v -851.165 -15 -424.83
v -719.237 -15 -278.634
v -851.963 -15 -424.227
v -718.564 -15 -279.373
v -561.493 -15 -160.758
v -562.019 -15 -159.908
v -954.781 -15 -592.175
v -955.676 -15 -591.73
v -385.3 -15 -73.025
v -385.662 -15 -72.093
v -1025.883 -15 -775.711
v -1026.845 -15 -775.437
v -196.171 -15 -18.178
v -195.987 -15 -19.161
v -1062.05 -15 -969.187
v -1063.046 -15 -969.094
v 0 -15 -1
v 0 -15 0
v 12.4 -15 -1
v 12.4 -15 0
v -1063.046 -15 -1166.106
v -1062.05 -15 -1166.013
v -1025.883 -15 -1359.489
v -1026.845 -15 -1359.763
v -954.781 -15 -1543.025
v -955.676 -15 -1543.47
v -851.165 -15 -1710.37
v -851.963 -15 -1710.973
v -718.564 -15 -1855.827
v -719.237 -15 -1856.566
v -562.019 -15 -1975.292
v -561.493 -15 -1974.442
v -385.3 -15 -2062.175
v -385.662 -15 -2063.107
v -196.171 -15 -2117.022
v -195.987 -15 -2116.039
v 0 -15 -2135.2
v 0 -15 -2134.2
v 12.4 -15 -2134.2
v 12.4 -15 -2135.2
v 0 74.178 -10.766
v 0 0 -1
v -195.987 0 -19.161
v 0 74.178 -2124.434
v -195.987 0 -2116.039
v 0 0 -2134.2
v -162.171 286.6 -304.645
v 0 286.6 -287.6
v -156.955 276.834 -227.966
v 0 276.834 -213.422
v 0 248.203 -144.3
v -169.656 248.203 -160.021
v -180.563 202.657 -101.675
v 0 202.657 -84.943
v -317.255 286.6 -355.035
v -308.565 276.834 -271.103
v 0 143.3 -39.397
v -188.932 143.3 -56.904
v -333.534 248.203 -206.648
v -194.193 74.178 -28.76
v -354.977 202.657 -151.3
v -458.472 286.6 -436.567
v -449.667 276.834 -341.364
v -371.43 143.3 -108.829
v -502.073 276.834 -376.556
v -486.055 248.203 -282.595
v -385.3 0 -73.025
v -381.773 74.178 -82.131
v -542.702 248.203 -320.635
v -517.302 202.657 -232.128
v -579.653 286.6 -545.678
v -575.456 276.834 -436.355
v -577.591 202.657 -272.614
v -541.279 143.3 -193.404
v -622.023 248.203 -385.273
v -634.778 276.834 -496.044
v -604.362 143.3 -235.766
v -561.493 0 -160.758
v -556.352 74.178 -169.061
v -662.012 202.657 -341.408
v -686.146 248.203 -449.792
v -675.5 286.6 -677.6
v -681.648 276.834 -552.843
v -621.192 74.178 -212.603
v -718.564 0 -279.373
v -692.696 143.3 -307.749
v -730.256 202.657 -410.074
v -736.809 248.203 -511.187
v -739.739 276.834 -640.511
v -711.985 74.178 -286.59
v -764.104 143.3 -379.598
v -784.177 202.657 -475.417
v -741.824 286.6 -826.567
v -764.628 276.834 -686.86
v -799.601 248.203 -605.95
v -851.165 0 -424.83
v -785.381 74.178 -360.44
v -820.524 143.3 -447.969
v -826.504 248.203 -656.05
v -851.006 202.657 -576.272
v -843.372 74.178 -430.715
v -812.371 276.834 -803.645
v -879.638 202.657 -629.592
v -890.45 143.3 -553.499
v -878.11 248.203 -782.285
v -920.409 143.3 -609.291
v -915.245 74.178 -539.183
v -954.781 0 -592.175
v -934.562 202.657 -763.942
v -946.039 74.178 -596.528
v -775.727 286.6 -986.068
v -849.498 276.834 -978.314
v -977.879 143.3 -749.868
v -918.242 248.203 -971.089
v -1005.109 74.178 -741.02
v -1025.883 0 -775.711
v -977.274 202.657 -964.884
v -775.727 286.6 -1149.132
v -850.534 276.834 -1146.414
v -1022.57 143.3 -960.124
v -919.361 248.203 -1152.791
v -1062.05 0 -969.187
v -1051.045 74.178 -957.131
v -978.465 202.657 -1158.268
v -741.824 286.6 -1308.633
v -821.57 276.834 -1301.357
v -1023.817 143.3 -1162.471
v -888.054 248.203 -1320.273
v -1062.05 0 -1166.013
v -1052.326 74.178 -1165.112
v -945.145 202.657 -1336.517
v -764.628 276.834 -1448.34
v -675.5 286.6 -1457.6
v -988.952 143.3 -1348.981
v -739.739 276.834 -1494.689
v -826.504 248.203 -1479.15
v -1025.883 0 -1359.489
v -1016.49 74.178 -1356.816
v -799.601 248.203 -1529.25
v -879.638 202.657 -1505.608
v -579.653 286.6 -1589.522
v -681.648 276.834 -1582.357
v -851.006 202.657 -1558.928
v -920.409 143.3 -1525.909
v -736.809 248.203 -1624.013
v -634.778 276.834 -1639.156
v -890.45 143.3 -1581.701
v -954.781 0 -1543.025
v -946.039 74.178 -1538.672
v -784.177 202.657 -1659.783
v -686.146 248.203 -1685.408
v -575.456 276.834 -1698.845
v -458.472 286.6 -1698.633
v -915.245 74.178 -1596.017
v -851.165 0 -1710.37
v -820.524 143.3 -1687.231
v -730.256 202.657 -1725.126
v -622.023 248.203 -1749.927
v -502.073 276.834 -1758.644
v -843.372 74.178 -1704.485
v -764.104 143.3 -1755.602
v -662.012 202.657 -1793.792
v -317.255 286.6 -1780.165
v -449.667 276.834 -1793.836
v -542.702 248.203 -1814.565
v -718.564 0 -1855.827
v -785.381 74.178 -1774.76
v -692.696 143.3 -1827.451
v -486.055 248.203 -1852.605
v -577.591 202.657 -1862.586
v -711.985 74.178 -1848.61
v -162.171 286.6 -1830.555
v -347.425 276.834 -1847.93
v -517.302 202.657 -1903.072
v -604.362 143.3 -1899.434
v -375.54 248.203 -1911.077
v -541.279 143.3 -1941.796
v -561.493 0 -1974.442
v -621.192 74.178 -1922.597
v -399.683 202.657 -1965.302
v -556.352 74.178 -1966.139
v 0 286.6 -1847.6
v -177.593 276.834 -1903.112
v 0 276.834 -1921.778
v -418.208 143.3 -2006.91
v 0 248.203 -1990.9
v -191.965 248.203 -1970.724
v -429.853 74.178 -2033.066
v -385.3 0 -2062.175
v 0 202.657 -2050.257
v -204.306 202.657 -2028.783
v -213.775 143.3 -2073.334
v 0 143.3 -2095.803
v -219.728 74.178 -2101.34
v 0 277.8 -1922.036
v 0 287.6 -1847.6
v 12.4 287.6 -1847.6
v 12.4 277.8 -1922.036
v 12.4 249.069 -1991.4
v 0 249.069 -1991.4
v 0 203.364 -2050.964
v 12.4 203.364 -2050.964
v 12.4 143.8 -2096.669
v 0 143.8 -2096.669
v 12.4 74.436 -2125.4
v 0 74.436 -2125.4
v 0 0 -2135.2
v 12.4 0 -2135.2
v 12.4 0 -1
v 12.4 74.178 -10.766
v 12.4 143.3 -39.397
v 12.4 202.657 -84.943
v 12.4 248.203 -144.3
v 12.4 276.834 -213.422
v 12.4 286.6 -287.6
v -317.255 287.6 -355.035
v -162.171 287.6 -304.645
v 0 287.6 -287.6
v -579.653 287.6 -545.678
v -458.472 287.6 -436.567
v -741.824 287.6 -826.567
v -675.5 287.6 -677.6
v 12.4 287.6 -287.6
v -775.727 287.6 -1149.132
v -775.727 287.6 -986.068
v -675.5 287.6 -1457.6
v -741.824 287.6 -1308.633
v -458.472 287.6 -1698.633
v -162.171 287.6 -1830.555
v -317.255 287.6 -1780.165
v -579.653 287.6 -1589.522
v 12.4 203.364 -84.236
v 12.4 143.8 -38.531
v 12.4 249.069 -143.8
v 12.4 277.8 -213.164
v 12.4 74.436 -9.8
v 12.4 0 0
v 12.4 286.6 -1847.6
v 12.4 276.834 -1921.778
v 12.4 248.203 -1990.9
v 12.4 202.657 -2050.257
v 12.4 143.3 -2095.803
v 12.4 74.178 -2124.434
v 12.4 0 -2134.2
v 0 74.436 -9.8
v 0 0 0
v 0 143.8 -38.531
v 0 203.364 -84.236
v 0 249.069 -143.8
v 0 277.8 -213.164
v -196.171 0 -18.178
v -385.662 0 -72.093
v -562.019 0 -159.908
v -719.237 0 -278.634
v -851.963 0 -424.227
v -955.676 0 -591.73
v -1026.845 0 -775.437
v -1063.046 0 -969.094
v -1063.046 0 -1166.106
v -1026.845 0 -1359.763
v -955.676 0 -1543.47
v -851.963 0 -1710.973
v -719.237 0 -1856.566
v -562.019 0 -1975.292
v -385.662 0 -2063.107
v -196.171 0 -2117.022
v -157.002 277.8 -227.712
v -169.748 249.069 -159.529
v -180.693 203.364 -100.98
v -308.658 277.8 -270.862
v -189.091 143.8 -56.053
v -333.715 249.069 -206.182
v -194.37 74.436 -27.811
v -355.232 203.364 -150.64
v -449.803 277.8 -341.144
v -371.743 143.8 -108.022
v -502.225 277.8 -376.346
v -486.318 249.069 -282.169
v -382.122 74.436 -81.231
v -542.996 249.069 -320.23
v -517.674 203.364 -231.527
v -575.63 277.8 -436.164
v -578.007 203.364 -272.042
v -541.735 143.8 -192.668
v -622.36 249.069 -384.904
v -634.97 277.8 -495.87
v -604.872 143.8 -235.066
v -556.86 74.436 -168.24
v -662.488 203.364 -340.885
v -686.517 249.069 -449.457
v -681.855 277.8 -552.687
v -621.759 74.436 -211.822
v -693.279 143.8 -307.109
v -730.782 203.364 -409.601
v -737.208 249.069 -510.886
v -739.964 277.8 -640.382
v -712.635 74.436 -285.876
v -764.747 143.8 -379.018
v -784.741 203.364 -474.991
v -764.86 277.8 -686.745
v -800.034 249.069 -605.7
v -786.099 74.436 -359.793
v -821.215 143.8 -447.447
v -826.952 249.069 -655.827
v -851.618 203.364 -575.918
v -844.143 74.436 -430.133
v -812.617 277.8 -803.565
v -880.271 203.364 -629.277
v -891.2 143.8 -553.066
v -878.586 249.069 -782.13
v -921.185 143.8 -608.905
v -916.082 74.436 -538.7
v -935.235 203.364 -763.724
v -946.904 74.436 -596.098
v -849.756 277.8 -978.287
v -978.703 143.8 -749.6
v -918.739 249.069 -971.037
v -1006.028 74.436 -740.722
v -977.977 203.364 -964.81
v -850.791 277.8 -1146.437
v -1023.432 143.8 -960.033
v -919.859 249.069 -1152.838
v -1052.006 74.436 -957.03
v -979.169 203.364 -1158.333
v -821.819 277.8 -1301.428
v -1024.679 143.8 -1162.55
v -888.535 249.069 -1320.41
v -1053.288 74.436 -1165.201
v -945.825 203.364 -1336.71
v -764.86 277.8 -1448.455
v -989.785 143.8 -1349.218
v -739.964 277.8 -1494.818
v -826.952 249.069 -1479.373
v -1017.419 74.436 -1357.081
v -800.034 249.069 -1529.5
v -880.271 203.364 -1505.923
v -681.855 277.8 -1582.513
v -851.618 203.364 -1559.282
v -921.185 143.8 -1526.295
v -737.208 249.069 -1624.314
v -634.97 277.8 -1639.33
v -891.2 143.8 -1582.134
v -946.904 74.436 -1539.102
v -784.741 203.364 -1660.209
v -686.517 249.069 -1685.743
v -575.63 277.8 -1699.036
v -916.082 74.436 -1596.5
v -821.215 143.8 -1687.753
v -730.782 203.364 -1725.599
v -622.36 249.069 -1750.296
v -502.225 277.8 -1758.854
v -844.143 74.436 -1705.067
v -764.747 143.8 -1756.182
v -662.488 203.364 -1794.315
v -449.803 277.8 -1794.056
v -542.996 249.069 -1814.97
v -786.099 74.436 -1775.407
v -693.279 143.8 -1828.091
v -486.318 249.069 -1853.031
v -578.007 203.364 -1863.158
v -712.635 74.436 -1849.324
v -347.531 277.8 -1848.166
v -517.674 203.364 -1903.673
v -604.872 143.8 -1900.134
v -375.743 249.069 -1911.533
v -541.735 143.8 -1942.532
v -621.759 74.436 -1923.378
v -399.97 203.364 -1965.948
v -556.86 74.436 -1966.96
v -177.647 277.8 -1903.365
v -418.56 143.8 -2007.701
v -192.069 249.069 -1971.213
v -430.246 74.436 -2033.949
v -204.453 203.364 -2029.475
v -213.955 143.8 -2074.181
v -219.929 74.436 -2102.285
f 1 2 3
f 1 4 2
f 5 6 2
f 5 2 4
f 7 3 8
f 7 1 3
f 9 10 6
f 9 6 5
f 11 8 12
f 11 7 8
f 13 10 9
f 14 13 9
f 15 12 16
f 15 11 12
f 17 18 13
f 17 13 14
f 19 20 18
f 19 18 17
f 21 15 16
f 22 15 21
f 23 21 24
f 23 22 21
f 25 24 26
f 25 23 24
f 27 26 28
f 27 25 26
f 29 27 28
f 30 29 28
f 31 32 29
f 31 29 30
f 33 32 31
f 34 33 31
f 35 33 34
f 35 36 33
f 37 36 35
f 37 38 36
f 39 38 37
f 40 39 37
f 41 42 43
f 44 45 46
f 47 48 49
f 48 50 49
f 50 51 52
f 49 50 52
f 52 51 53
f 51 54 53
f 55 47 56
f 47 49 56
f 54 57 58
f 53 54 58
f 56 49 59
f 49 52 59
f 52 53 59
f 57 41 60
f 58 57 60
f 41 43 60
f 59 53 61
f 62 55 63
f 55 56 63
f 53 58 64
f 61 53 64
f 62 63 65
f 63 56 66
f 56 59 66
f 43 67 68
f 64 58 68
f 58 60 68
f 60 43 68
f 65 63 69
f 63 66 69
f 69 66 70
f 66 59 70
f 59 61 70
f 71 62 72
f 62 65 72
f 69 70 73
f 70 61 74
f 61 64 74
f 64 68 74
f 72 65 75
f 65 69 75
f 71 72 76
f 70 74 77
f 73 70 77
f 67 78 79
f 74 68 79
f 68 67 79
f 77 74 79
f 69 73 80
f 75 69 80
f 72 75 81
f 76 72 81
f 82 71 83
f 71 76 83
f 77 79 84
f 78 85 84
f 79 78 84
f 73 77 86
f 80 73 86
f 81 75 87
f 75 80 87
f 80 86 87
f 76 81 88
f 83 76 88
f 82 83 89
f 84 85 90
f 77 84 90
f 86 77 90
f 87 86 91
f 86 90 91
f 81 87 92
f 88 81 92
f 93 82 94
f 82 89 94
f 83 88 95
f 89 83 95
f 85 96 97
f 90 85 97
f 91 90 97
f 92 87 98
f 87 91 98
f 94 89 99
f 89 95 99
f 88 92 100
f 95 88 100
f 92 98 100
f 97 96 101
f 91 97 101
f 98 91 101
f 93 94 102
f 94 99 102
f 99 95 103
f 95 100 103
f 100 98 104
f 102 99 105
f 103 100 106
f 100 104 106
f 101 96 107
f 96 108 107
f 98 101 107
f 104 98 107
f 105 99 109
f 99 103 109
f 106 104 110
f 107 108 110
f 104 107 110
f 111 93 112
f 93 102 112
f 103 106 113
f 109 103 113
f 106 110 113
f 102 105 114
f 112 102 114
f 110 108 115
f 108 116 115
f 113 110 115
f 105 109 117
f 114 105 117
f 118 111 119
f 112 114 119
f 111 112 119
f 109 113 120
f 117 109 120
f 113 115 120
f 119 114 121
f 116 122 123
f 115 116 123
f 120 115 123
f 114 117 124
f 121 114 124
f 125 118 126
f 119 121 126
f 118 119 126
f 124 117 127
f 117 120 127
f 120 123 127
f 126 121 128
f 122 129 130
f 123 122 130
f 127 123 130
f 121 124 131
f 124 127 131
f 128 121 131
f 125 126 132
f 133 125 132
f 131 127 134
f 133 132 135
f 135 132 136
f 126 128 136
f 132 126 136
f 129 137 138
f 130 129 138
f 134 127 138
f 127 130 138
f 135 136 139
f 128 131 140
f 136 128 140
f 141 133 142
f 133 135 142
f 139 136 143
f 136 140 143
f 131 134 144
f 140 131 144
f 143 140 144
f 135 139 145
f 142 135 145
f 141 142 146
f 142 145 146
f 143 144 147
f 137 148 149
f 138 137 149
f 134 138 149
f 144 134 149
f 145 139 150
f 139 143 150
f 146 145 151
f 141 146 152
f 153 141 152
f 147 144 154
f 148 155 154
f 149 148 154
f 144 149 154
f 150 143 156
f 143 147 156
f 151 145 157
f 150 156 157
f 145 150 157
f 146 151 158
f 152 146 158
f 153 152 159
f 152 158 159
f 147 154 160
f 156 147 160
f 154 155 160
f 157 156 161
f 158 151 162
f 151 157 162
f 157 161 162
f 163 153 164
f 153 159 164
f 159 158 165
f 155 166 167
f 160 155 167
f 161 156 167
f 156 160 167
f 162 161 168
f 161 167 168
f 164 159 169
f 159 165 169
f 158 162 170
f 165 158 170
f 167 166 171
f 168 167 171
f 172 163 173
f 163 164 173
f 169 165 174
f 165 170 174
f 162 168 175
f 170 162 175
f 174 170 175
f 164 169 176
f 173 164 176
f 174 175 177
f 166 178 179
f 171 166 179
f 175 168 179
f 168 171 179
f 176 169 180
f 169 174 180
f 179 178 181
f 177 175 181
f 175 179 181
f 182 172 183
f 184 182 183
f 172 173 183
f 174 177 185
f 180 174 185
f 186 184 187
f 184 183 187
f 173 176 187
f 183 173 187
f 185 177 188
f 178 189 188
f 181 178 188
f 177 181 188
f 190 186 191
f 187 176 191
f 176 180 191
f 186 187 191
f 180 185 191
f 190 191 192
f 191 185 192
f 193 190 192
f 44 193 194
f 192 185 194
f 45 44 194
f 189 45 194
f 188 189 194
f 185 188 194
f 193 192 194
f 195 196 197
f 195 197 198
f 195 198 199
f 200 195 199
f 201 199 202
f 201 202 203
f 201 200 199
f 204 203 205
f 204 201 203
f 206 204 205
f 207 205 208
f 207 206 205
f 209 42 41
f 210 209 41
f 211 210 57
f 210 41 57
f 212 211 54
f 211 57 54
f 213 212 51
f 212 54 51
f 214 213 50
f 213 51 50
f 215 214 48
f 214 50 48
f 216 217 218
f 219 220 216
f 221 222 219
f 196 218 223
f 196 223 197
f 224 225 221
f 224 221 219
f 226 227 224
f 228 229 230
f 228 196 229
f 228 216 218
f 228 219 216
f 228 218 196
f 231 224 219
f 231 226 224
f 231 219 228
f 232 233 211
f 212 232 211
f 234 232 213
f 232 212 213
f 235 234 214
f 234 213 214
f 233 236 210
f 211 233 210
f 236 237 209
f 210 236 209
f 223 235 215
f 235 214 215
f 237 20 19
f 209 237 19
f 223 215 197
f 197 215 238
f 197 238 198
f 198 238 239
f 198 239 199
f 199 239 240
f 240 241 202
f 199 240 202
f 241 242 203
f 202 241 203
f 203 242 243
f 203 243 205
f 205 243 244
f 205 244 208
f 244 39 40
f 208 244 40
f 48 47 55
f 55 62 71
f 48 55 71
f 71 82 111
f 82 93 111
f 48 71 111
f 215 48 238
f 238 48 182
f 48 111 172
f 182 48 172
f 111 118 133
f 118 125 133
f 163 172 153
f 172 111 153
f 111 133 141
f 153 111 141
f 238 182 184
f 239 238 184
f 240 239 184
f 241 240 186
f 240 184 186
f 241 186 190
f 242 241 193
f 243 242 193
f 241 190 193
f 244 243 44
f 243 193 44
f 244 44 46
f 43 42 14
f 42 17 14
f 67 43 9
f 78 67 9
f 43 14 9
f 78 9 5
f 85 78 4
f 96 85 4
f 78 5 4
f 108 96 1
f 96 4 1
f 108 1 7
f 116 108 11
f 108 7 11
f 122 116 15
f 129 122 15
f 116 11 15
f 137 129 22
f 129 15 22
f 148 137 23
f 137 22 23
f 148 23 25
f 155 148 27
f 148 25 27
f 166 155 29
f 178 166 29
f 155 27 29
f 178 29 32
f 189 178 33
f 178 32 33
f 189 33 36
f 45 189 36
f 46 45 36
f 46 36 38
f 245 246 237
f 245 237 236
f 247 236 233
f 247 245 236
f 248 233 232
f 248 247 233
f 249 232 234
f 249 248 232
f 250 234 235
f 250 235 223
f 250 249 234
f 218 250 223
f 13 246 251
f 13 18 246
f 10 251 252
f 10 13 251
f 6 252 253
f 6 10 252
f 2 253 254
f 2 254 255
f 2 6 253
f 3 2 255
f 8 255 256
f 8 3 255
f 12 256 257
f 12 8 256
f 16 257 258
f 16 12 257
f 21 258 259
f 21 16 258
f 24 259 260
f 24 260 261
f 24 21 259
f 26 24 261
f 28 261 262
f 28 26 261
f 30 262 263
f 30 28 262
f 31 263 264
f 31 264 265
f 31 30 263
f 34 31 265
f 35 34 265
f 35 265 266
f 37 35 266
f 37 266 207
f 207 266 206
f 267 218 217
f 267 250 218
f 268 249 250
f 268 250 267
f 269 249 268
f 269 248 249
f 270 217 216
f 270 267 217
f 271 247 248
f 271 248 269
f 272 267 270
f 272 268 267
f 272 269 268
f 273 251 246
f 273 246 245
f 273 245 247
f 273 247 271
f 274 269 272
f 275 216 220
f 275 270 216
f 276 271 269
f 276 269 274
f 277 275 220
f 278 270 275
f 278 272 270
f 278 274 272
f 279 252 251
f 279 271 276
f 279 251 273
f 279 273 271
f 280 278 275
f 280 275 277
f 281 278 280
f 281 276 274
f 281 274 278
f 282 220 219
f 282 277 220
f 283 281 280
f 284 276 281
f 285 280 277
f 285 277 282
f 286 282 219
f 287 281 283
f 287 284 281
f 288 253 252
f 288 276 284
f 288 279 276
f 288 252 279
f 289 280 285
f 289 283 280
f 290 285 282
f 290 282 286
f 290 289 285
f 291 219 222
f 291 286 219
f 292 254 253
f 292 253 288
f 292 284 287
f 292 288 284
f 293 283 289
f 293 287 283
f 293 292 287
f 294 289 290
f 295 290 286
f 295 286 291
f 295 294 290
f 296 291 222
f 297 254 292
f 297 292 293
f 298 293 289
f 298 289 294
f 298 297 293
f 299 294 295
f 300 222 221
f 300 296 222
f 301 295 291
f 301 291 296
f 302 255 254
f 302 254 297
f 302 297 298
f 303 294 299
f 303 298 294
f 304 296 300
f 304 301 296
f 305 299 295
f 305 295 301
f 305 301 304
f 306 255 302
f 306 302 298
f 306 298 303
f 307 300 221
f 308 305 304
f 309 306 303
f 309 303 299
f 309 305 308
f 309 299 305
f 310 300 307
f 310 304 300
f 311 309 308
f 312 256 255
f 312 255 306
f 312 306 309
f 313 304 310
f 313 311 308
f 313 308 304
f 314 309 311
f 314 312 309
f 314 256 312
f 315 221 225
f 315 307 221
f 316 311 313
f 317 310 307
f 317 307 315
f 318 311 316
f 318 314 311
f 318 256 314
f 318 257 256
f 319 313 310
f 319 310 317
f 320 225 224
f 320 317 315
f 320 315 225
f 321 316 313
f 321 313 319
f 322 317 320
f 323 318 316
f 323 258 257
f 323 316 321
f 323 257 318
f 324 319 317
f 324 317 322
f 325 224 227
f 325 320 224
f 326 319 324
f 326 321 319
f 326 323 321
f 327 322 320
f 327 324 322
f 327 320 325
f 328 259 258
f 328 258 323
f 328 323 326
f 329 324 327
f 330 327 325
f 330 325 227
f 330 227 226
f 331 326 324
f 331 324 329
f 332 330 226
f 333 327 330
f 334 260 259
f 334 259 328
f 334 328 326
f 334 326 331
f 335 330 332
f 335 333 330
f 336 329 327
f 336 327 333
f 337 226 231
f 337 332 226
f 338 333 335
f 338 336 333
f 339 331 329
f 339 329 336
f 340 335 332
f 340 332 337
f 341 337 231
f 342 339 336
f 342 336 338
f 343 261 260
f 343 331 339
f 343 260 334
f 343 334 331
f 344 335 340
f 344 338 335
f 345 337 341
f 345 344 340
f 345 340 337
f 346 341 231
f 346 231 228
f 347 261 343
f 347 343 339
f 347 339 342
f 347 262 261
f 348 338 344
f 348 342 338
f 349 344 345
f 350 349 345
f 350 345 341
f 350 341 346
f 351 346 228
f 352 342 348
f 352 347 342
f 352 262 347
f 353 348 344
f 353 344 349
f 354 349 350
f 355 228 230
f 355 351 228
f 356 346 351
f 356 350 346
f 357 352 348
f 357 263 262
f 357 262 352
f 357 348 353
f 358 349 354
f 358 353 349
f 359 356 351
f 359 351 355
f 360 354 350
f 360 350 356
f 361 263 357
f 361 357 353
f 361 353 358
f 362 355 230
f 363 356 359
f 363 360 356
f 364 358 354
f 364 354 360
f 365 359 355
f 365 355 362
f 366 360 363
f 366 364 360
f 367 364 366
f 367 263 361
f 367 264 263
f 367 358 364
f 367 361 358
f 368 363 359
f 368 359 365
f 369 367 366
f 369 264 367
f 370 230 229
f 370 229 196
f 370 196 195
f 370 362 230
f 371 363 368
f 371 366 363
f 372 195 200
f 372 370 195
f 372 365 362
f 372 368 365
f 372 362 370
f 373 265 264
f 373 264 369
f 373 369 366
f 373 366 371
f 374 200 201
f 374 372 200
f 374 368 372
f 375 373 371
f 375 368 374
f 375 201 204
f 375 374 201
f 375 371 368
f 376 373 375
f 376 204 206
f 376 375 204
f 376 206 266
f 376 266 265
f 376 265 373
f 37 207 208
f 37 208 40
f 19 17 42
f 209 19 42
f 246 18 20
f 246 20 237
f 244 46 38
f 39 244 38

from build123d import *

# Parameters (mm, degrees)
SURFACE_REVOLVE1_2_ANGLE = 180
SURFACE_EXTRUDE1_3_DEPTH = 12.4
THICKEN1_T2              = 1


with BuildPart() as body_1:
    # Surface-Revolve1: a surface, the sketch's curves turned about an axis by 180 degrees
    with BuildLine(Plane(origin=(0, 0, 0), x_dir=(0, 0, -1), z_dir=(1, 0, 0)), mode=Mode.PRIVATE) as surface_revolve1_2_path:
        Line((1067.6, 287.6), (287.6, 287.6))
        ThreePointArc((287.6, 287.6), (84.236089731, 203.363910269), (0, 0))
        Line((0, 0), (0, -15))
    surface_revolve1_2 = Shell.revolve(surface_revolve1_2_path.wire(), SURFACE_REVOLVE1_2_ANGLE, Axis((0, 287.6, -1067.6), (0, -1, 0)))
    # Surface-Extrude1: a surface, the sketch's curves swept straight by 12.4 mm
    with BuildLine(Plane(origin=(0, 0, 0), x_dir=(0, 0, -1), z_dir=(1, 0, 0)), mode=Mode.PRIVATE) as surface_extrude1_3_path:
        Line((0, -15), (0, 0))
        ThreePointArc((0, 0), (84.236089731, 203.363910269), (287.6, 287.6))
        Line((287.6, 287.6), (1847.6, 287.6))
        ThreePointArc((1847.6, 287.6), (2050.963910269, 203.363910269), (2135.2, 0))
        Line((2135.2, 0), (2135.2, -15))
    surface_extrude1_3 = Shell.extrude(surface_extrude1_3_path.wire(), (1 * SURFACE_EXTRUDE1_3_DEPTH, 0 * SURFACE_EXTRUDE1_3_DEPTH, 0 * SURFACE_EXTRUDE1_3_DEPTH))
    # Surface-Knit1: the surfaces knitted into one
    surface_knit1_1 = Shell(Face.sew_faces(surface_revolve1_2.faces() + surface_extrude1_3.faces())[0])
    add(Solid.thicken(surface_knit1_1, -THICKEN1_T2))


solid = body_1.part
